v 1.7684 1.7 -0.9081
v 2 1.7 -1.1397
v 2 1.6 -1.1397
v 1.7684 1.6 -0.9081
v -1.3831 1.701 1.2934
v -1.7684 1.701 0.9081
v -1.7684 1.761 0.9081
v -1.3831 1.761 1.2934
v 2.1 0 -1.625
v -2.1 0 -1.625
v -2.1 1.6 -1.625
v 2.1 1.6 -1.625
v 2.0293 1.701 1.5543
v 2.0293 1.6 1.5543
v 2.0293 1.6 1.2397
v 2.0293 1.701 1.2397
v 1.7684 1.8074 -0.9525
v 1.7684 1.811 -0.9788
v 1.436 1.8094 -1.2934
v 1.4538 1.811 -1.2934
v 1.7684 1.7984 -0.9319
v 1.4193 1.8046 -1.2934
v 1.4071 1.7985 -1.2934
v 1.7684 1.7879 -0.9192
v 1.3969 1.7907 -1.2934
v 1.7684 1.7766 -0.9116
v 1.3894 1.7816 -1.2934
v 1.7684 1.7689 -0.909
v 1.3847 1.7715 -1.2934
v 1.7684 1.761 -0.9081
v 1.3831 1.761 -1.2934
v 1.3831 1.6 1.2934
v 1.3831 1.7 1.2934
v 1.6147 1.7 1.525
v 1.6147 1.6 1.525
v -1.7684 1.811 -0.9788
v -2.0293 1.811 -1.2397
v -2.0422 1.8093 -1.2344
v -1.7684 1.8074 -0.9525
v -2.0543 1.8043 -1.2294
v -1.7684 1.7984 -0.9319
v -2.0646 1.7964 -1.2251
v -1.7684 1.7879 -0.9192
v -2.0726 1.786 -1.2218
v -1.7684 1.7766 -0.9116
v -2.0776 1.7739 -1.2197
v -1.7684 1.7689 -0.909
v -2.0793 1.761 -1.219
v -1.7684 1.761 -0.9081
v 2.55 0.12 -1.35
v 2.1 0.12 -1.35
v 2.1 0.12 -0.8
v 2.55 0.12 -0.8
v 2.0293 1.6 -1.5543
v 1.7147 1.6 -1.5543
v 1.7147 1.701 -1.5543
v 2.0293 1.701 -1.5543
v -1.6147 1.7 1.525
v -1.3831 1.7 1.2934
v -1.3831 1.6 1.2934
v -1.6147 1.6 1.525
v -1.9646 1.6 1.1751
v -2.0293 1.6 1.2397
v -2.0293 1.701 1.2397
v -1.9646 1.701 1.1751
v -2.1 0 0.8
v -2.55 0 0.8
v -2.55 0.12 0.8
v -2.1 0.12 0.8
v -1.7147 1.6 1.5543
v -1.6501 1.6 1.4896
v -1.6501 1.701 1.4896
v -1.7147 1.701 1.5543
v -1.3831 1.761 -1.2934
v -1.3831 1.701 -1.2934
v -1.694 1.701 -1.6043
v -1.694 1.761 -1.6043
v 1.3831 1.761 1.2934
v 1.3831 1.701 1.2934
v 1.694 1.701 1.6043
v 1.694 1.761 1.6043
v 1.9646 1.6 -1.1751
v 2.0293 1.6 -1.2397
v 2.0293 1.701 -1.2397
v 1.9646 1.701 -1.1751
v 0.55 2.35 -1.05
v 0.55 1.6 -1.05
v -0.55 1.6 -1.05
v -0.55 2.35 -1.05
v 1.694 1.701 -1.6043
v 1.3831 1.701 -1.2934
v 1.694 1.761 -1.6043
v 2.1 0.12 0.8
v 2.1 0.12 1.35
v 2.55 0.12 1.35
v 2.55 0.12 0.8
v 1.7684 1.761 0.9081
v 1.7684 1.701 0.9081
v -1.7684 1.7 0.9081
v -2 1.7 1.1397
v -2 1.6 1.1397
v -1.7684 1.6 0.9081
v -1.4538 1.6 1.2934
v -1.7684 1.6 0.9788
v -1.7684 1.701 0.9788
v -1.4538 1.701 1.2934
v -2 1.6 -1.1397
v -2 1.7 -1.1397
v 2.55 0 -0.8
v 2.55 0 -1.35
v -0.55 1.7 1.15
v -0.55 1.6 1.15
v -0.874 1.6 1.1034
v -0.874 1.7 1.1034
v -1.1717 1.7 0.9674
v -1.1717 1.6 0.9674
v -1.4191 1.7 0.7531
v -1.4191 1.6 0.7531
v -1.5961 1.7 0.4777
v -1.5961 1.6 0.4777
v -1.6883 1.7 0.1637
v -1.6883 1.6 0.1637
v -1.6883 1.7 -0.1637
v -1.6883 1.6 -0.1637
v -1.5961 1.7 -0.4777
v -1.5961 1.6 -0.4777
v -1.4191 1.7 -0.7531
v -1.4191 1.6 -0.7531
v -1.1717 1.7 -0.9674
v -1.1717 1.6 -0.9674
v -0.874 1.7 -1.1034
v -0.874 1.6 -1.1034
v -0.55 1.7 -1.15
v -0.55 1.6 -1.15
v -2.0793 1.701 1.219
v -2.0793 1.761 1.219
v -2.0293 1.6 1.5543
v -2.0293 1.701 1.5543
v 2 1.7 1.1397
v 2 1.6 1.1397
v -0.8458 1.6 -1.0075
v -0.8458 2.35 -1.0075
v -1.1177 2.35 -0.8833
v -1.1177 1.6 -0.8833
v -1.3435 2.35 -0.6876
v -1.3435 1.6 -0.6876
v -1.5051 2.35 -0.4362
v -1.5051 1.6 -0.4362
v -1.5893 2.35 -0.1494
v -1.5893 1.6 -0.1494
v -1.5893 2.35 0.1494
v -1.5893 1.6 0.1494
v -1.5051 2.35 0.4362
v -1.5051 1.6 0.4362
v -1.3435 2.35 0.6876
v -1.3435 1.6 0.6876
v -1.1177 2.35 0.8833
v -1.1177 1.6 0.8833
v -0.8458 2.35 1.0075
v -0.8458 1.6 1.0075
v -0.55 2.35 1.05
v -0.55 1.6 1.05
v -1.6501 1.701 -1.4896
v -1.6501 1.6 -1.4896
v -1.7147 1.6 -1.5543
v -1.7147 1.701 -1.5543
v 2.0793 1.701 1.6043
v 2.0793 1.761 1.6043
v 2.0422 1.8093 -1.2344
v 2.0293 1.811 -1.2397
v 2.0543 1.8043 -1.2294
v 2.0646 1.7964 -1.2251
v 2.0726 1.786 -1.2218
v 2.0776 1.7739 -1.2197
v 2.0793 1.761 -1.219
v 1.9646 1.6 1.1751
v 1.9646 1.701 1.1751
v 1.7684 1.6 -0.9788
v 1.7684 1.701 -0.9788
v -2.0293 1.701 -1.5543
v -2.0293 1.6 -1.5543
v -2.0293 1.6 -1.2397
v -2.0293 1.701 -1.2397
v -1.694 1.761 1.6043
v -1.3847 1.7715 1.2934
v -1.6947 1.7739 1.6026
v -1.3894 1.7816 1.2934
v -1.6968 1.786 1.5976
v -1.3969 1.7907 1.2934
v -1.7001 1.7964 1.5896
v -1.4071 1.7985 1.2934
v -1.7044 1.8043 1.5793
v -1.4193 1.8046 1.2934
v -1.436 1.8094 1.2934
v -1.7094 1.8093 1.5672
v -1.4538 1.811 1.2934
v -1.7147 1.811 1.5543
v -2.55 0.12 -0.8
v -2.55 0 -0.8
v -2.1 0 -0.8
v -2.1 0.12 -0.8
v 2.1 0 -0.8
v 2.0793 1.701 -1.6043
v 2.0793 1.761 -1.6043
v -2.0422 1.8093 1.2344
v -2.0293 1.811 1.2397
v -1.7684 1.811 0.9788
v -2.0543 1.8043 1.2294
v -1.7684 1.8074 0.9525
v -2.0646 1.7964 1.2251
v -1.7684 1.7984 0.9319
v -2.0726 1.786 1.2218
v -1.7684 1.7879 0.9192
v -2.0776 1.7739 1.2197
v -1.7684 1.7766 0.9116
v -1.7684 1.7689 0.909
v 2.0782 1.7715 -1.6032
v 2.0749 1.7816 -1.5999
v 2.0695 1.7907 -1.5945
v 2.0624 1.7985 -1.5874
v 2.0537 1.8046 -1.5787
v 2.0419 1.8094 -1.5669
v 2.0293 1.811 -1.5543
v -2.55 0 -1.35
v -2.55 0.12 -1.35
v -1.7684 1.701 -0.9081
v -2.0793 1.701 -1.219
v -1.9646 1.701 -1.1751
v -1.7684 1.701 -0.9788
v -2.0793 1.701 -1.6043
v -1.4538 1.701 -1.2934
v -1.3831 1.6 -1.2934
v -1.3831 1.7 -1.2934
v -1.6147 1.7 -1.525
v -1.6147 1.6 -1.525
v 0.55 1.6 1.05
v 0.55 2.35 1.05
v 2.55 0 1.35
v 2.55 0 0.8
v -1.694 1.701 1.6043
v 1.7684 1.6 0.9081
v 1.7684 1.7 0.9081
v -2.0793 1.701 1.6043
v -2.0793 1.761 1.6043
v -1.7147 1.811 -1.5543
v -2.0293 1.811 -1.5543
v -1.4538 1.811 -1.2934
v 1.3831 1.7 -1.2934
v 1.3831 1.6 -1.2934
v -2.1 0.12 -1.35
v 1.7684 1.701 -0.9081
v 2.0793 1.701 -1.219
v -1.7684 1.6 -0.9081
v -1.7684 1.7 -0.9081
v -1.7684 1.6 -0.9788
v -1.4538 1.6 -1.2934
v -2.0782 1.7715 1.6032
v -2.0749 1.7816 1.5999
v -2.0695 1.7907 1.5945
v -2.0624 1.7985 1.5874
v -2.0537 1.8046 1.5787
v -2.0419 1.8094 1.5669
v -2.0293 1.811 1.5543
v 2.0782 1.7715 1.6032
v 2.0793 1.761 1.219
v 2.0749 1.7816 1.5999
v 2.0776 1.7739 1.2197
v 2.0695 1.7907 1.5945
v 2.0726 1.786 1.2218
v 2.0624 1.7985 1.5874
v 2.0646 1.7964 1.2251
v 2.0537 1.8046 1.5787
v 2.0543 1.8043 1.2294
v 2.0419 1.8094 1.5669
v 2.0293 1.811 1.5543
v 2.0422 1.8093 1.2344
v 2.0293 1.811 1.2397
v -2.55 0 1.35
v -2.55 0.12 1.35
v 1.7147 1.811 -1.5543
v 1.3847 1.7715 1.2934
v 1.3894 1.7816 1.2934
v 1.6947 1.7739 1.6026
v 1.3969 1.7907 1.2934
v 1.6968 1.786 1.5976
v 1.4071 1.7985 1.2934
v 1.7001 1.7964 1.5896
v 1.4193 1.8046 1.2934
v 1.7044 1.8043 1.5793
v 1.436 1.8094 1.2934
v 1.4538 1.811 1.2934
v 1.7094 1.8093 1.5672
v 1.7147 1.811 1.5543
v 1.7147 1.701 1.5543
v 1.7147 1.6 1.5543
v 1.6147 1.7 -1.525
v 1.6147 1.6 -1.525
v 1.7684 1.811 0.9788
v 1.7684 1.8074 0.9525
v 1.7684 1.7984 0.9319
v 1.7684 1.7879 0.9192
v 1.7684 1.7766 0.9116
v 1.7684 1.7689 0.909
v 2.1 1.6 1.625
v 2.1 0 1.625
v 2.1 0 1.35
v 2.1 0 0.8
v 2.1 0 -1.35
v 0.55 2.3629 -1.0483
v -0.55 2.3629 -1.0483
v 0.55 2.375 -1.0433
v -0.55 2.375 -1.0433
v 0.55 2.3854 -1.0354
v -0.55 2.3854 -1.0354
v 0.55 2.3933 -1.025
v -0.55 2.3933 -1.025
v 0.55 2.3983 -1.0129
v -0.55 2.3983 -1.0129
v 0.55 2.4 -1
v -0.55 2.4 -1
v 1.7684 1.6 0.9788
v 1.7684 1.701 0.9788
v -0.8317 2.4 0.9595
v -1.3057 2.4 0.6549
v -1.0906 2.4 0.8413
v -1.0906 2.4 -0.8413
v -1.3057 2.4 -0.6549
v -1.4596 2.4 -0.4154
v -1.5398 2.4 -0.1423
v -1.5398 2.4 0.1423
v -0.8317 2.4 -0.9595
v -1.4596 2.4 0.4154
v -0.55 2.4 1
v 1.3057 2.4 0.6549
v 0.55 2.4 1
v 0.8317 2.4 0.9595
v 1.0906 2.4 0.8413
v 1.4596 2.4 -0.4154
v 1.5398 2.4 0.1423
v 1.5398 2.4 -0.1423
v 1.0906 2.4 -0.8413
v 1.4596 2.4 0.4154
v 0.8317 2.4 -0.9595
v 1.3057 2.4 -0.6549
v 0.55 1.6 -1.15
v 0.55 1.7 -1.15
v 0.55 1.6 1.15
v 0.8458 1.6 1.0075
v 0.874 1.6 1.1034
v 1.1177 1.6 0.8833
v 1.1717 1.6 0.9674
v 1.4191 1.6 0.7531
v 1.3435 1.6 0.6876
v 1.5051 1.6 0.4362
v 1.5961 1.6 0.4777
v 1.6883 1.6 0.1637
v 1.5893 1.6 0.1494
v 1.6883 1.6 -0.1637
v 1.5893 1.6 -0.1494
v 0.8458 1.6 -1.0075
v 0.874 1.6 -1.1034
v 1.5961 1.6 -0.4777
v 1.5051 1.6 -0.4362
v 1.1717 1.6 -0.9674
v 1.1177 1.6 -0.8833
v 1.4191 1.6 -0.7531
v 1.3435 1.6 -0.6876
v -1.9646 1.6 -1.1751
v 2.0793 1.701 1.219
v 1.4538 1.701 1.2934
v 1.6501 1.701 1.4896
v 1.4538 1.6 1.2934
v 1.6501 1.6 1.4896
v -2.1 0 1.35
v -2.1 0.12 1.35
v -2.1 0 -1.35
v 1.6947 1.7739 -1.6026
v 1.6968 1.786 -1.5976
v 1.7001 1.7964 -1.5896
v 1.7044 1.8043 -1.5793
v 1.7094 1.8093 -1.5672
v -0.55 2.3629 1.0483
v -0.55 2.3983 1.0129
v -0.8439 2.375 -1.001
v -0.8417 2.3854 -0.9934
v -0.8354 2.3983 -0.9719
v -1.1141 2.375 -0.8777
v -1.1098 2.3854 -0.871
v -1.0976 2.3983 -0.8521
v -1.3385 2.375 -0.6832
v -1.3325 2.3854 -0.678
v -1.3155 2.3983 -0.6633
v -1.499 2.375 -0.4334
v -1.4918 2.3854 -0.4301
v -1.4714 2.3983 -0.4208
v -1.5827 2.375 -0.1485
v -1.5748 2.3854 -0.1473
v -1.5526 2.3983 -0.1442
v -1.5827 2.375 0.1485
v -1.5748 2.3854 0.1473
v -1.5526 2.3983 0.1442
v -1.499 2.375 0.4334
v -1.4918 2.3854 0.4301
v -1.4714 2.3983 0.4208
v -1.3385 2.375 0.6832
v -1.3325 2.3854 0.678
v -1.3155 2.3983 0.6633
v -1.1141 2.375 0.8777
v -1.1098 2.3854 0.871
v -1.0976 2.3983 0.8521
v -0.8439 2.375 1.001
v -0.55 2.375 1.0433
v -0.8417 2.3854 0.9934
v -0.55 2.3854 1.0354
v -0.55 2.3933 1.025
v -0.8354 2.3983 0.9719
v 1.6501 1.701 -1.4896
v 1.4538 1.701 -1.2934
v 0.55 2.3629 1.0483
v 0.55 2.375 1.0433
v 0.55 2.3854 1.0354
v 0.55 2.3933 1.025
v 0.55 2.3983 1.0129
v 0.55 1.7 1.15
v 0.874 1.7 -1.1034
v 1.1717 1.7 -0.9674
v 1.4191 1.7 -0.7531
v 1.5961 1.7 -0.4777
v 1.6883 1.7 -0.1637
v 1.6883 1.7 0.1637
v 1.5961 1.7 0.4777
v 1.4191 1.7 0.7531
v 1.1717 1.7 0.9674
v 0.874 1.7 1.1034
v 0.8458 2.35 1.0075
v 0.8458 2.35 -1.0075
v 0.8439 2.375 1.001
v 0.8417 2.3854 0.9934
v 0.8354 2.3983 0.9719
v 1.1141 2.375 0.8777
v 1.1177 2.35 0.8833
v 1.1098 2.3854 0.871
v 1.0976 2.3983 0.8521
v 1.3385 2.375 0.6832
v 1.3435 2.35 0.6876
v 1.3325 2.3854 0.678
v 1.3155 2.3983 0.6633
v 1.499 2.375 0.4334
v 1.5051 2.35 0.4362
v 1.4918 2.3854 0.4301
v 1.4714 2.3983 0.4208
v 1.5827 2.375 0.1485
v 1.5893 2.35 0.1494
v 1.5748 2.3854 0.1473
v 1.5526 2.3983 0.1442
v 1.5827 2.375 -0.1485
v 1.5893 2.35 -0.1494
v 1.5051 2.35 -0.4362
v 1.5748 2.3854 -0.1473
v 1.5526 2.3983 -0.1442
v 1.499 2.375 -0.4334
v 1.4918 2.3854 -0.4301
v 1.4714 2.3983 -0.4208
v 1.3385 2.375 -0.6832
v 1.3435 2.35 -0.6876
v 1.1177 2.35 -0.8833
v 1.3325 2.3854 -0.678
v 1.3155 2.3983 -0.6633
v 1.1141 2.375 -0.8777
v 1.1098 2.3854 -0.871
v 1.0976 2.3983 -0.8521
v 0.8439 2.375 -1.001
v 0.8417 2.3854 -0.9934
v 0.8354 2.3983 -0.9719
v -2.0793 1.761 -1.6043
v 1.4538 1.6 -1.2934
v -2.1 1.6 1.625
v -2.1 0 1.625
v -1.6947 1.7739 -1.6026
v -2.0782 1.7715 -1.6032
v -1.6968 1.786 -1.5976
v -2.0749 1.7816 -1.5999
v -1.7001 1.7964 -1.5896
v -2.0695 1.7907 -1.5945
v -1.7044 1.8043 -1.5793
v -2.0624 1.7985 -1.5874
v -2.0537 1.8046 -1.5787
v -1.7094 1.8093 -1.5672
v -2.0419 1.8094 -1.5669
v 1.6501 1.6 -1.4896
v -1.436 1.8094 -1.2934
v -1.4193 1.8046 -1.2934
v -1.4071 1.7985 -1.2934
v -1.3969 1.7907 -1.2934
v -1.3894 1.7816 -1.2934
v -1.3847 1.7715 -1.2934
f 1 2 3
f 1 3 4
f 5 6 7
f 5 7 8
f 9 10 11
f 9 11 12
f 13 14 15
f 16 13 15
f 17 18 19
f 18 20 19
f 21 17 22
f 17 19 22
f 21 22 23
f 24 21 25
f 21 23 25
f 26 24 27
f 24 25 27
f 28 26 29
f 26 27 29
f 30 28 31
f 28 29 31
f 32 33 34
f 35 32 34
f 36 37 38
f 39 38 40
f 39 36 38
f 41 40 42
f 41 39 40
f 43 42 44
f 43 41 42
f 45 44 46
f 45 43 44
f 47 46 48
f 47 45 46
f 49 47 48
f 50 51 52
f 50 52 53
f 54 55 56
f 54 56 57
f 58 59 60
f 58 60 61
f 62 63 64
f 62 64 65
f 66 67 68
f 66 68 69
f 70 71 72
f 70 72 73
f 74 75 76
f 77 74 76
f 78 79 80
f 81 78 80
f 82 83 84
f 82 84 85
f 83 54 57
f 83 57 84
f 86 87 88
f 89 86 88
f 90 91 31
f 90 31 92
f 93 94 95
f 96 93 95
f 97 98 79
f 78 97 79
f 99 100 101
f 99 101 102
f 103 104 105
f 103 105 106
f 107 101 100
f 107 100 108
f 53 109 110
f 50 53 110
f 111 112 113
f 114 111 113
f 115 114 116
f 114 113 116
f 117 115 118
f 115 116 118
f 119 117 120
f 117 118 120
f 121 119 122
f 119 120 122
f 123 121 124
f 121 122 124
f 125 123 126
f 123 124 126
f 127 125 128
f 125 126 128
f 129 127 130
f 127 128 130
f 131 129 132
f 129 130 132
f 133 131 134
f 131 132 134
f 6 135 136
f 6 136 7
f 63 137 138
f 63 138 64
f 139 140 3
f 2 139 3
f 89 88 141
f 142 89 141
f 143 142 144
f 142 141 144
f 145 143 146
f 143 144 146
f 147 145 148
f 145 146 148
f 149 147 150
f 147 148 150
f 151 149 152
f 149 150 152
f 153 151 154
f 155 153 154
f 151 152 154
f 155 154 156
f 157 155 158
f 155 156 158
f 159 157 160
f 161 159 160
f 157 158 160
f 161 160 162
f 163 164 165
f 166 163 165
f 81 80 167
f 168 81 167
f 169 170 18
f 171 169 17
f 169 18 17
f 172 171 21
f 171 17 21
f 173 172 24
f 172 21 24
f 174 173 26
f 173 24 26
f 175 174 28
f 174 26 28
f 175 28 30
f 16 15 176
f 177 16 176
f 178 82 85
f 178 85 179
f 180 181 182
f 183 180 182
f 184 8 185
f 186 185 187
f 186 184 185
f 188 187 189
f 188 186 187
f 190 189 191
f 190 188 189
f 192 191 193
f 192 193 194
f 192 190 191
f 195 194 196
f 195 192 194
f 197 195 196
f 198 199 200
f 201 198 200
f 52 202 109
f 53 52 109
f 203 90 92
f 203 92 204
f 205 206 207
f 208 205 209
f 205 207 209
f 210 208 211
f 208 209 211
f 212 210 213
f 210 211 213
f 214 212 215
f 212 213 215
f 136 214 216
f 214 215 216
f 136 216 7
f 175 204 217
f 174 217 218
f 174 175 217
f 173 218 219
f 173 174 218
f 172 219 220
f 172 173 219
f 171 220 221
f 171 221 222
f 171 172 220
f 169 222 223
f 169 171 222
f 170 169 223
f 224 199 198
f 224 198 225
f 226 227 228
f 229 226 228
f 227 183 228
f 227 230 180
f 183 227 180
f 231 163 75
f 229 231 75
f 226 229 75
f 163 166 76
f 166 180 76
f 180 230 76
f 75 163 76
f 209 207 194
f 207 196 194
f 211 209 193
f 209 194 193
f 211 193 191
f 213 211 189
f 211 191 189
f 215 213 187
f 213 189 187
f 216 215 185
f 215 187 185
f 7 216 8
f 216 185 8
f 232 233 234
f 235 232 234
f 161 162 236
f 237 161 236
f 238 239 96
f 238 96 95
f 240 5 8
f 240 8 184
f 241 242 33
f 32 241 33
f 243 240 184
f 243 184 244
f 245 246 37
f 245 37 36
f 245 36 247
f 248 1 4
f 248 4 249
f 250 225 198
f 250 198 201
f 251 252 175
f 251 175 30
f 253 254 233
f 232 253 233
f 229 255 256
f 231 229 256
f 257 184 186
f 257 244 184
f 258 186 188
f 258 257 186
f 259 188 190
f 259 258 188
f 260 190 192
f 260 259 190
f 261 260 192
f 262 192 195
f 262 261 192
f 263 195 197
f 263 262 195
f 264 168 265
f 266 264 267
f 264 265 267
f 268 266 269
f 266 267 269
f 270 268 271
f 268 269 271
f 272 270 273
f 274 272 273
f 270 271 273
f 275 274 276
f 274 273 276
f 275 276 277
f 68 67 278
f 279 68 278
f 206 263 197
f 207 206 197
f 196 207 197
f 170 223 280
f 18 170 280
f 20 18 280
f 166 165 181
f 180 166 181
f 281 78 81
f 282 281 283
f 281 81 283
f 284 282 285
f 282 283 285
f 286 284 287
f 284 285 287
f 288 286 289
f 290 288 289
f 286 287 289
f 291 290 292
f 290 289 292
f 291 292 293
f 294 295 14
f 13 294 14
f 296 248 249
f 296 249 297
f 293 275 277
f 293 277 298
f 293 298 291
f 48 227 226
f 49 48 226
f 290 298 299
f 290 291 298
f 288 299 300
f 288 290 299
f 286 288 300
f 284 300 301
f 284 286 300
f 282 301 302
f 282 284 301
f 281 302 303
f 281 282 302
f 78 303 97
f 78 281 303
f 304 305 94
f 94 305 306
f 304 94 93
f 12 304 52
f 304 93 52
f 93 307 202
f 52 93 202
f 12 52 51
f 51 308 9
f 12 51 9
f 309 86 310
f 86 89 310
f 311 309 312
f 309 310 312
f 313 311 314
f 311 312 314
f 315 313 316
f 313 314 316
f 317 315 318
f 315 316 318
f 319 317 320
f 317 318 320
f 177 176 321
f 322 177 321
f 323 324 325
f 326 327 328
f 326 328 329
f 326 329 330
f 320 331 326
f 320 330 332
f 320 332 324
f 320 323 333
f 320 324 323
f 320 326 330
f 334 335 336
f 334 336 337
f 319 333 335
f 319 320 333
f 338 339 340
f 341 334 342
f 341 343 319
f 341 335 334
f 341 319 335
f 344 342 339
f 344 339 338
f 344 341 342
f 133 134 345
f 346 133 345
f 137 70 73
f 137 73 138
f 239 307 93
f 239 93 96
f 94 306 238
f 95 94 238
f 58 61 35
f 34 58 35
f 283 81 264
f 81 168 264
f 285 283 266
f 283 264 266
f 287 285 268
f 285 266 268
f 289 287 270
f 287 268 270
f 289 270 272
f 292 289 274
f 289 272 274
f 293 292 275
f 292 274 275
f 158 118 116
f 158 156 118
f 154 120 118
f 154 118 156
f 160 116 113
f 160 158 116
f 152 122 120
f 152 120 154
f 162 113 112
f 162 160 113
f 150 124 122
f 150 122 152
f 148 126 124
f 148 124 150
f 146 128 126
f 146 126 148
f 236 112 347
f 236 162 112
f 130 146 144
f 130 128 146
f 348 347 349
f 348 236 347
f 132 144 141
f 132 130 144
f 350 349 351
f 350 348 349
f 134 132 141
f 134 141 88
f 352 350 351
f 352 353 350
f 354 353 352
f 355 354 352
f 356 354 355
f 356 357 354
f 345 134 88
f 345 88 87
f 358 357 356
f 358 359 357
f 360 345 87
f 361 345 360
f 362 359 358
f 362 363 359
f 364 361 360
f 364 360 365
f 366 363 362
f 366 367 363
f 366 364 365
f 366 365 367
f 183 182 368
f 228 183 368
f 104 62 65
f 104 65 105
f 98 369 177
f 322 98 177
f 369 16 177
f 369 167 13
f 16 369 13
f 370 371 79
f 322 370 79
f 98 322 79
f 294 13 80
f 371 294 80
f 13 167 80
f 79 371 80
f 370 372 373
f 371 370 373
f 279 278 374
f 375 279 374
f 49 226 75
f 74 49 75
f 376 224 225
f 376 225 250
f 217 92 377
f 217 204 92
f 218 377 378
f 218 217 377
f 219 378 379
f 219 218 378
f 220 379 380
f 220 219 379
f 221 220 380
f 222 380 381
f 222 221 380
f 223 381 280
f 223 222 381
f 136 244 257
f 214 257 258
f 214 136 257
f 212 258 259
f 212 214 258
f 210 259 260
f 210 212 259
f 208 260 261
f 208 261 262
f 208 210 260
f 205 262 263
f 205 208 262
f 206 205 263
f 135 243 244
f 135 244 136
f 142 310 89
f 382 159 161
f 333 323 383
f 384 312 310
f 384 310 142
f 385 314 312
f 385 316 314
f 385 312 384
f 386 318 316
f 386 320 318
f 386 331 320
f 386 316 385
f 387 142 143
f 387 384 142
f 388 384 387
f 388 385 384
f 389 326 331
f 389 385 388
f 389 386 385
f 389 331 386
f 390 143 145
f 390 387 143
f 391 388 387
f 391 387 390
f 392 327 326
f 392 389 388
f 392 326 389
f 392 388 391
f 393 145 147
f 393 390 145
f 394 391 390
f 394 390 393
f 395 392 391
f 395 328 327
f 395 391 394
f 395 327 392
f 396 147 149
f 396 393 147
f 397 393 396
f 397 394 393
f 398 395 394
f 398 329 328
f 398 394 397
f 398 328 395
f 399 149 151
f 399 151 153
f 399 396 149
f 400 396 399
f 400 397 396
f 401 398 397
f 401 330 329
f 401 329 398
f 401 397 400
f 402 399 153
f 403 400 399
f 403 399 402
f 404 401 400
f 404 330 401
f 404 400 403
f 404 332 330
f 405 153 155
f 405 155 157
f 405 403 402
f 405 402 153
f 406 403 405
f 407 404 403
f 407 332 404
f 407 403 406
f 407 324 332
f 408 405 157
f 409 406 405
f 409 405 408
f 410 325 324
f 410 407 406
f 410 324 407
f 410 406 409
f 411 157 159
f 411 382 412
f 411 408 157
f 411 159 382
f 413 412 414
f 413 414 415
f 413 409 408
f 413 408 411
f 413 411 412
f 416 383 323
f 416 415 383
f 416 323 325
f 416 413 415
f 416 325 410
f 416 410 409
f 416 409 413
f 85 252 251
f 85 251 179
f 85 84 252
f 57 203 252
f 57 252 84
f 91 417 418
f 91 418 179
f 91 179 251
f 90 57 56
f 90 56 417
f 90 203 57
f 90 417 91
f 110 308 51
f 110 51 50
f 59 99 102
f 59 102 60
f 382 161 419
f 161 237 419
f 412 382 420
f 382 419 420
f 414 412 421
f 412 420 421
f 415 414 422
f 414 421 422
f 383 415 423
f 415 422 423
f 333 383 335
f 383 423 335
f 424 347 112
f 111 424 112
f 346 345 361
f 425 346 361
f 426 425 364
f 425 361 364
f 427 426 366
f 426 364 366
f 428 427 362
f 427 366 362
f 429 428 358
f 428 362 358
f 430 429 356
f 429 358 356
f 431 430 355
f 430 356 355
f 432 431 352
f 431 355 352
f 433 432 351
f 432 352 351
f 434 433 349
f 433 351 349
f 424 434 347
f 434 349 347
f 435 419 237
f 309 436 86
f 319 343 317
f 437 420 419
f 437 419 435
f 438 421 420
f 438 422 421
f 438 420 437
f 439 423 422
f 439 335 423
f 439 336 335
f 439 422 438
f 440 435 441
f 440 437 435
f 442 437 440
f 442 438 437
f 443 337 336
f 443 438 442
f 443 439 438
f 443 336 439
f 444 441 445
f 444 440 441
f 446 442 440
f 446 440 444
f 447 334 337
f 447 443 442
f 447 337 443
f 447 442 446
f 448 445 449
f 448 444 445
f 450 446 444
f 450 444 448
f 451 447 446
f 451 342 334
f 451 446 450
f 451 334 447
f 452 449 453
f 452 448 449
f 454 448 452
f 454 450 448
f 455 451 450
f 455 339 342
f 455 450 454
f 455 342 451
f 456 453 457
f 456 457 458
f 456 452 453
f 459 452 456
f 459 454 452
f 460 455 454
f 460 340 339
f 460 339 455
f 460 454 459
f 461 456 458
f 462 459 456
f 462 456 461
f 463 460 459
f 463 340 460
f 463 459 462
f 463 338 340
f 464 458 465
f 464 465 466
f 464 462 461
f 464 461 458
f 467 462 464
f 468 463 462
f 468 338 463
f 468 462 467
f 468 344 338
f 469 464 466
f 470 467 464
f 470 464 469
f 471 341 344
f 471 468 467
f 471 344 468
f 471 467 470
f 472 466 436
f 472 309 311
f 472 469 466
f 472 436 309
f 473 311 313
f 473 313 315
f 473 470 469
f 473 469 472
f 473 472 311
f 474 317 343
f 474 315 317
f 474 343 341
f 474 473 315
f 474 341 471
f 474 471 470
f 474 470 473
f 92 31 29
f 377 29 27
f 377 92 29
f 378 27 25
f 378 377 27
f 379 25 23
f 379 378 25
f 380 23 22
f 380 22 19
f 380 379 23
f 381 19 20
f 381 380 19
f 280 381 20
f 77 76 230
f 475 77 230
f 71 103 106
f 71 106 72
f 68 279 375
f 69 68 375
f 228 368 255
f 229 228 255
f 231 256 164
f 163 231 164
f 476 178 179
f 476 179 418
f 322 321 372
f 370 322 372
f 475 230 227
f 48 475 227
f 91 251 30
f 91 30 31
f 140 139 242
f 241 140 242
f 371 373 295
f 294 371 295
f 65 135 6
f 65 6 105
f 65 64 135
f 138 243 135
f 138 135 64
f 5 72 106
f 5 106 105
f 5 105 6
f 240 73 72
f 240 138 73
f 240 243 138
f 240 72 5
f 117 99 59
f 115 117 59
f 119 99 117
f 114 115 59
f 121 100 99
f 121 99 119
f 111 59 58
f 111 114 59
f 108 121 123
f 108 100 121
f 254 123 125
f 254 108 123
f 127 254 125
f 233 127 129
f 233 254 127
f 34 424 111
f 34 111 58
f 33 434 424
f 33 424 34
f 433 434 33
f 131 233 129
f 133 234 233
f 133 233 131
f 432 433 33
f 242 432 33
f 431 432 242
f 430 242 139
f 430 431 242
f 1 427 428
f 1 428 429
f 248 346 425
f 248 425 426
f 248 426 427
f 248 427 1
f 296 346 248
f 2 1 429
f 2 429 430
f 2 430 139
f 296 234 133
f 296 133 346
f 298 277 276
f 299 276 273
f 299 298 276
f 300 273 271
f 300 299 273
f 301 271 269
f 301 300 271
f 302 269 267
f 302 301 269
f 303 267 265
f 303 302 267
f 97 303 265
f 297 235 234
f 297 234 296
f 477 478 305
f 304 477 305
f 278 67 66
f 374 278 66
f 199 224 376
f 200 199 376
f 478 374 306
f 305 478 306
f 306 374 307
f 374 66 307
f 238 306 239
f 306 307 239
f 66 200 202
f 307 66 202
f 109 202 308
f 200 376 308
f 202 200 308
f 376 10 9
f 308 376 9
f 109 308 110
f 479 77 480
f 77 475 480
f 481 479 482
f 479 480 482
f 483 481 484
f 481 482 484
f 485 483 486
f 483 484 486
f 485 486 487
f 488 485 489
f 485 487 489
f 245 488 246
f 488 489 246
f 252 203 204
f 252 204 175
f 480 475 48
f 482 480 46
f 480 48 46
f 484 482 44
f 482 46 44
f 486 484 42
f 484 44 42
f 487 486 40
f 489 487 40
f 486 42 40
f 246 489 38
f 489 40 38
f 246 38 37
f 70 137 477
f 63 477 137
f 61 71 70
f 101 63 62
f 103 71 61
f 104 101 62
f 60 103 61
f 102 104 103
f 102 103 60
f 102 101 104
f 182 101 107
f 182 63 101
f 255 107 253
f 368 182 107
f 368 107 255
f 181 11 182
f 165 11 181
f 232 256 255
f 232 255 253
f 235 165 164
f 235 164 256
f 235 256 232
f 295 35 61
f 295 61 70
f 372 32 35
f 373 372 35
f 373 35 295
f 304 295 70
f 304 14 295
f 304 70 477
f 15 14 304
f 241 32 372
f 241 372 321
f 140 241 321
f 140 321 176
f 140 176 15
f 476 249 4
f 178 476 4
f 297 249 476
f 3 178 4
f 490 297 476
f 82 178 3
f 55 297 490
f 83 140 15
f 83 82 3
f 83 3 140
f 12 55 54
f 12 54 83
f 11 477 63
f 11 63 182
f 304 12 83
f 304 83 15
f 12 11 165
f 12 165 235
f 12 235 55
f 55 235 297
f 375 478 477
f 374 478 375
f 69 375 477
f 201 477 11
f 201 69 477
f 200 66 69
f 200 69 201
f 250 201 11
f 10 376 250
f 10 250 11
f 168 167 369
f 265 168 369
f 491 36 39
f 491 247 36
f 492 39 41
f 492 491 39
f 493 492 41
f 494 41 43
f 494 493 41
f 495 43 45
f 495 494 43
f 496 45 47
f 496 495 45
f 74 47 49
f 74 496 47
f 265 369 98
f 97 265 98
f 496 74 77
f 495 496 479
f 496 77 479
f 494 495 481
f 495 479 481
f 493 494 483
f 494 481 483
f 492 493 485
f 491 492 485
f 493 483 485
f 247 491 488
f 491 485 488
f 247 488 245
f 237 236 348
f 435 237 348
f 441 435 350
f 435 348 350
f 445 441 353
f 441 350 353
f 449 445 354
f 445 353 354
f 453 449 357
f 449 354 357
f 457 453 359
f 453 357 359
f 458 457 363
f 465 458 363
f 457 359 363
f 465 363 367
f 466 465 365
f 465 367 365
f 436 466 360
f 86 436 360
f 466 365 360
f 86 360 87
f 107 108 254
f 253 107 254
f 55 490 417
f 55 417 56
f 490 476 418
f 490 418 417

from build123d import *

# Parameters (mm, degrees)
SKETCH1_W            = 4.2
SKETCH1_H            = 3.25
BOSS_EXTRUDE1_DEPTH  = 1.6
SKETCH2_W            = 4
SKETCH2_H            = 3.05
BOSS_EXTRUDE2_DEPTH  = 0.1
BOSS_EXTRUDE3_DEPTH  = 0.8
SKETCH4_W            = 5.1
SKETCH4_H            = 0.55
LEAD_DEPTH           = 0.12
FILLET1_R            = 0.05
CUT_EXTRUDE1_DEPTH   = 0.1
MIRROR4_COPY_1_DEPTH = 0.1
BOSS_EXTRUDE5_DEPTH  = 0.101
BOSS_EXTRUDE6_DEPTH  = 0.11
FILLET3_R            = 0.05
FILLET3_OF_MIRROR6_R = 0.05


# Read off the part's stored shape, not the designer's step: Mirror7
with BuildPart() as part:
    # Sketch1 → Boss-Extrude1 (new body)
    with BuildSketch(Plane(origin=(0, 0, 0), x_dir=(1, 0, 0), z_dir=(0, 1, 0))):
        Rectangle(SKETCH1_W, SKETCH1_H)
    extrude(amount=BOSS_EXTRUDE1_DEPTH)

    # Sketch2 → Boss-Extrude2 (add)
    with BuildSketch(Plane(origin=(0, 1.6, 0), x_dir=(1, 0, 0), z_dir=(0, 1, 0))):
        Rectangle(SKETCH2_W, SKETCH2_H)
        with BuildLine():
            Line((-0.55, 1.15), (0.55, 1.15))
            ThreePointArc((0.55, 1.15), (1.7, 0), (0.55, -1.15))
            Line((0.55, -1.15), (-0.55, -1.15))
            ThreePointArc((-0.55, -1.15), (-1.7, 0), (-0.55, 1.15))
        make_face(mode=Mode.SUBTRACT)
    extrude(amount=BOSS_EXTRUDE2_DEPTH)

    # Sketch3 → Boss-Extrude3 (add)
    with BuildSketch(Plane(origin=(0, 1.6, 0), x_dir=(1, 0, 0), z_dir=(0, 1, 0))):
        with BuildLine():
            Line((-0.55, -1.05), (0.55, -1.05))
            ThreePointArc((0.55, -1.05), (1.6, 0), (0.55, 1.05))
            Line((0.55, 1.05), (-0.55, 1.05))
            ThreePointArc((-0.55, 1.05), (-1.6, 0), (-0.55, -1.05))
        make_face()
    extrude(amount=BOSS_EXTRUDE3_DEPTH)

    # Sketch4 → lead (add)
    with BuildSketch(Plane.XZ):
        with Locations((0, 1.075)):
            Rectangle(SKETCH4_W, SKETCH4_H)
    lead = extrude(amount=-LEAD_DEPTH)

    # Mirror1: lead across plane
    add(lead.mirror(Plane.XY))

    # Fillet1
    fillet1_edges = [part.edges().sort_by_distance(p)[0] for p in [
        (-1.6, 2.4, 0),
        (0, 2.4, 1.05),
        (1.6, 2.4, 0),
        (0, 2.4, -1.05),
    ]]
    fillet(fillet1_edges, radius=FILLET1_R)

    # Sketch5 → Cut-Extrude1 (cut)
    with BuildSketch(Plane(origin=(0, 1.7, 0), x_dir=(1, 0, 0), z_dir=(0, 1, 0))):
        Polygon((-2, 1.525), (-2, 1.139738664), (-1.768366599, 0.908105264), (-1.383105264, 1.293366599), (-1.614738664, 1.525), align=None)
    cut_extrude1 = extrude(amount=-CUT_EXTRUDE1_DEPTH, mode=Mode.SUBTRACT)

    # Mirror3: Cut-Extrude1 across plane
    add(cut_extrude1.mirror(Plane(origin=(0, 0, 0), x_dir=(0, 0, 1), z_dir=(1, 0, 0))), mode=Mode.SUBTRACT)

    # Mirror4: Cut-Extrude1 across plane
    add(cut_extrude1.mirror(Plane.XY), mode=Mode.SUBTRACT)

    # Mirror4 copy 1 sketch → Mirror4 copy 1 (cut)
    with BuildSketch(Plane(origin=(0, 1.7, 0), x_dir=(-1, 0, 0), z_dir=(0, 1, 0))):
        Polygon((-2, 1.525), (-2, 1.139738664), (-1.768366599, 0.908105264), (-1.383105264, 1.293366599), (-1.614738664, 1.525), align=None)
    extrude(amount=-MIRROR4_COPY_1_DEPTH, mode=Mode.SUBTRACT)

    # Sketch6 → Boss-Extrude5 (add)
    with BuildSketch(Plane(origin=(0, 1.6, 0), x_dir=(1, 0, 0), z_dir=(0, 1, 0))):
        Polygon((-1.650094004, 1.489644661), (-1.714738664, 1.554289322), (-2.029289322, 1.554289322), (-2.029289322, 1.239738664), (-1.964644661, 1.175094004), (-1.768366599, 0.978815942), (-1.453815942, 1.293366599), align=None)
    boss_extrude5 = extrude(amount=BOSS_EXTRUDE5_DEPTH)

    # Sketch7 → Boss-Extrude6 (add)
    with BuildSketch(Plane(origin=(0, 1.701, 0), x_dir=(1, 0, 0), z_dir=(0, 1, 0))):
        Polygon((-1.694027986, 1.604289322), (-2.079289322, 1.604289322), (-2.079289322, 1.219027986), (-1.768366599, 0.908105264), (-1.383105264, 1.293366599), align=None)
    boss_extrude6 = extrude(amount=BOSS_EXTRUDE6_DEPTH)

    # Fillet3
    fillet3_edges = [part.edges().sort_by_distance(p)[0] for p in [
        (-1.538566625, 1.811, -1.44882796),
        (-1.886658654, 1.811, -1.604289322),
        (-2.079289322, 1.811, -1.411658654),
        (-1.92382796, 1.811, -1.063566625),
        (-1.575735931, 1.811, -1.100735931),
    ]]
    fillet(fillet3_edges, radius=FILLET3_R)

    # Mirror6: Boss-Extrude5, Boss-Extrude6 across plane
    add(boss_extrude5.mirror(Plane(origin=(0, 0, 0), x_dir=(0, 0, 1), z_dir=(1, 0, 0))))
    add(boss_extrude6.mirror(Plane(origin=(0, 0, 0), x_dir=(0, 0, 1), z_dir=(1, 0, 0))))

    # Fillet3 of Mirror6
    fillet3_of_mirror6_edges = [part.edges().sort_by_distance(p)[0] for p in [
        (1.538566625, 1.811, -1.44882796),
        (1.886658654, 1.811, -1.604289322),
        (2.079289322, 1.811, -1.411658654),
        (1.92382796, 1.811, -1.063566625),
        (1.575735931, 1.811, -1.100735931),
    ]]
    fillet(fillet3_of_mirror6_edges, radius=FILLET3_OF_MIRROR6_R)

    # Mirror7: part across plane


with BuildPart() as part_1:
    add(part.part)
    add(part.part.mirror(Plane.XY))


solid = part_1.part
